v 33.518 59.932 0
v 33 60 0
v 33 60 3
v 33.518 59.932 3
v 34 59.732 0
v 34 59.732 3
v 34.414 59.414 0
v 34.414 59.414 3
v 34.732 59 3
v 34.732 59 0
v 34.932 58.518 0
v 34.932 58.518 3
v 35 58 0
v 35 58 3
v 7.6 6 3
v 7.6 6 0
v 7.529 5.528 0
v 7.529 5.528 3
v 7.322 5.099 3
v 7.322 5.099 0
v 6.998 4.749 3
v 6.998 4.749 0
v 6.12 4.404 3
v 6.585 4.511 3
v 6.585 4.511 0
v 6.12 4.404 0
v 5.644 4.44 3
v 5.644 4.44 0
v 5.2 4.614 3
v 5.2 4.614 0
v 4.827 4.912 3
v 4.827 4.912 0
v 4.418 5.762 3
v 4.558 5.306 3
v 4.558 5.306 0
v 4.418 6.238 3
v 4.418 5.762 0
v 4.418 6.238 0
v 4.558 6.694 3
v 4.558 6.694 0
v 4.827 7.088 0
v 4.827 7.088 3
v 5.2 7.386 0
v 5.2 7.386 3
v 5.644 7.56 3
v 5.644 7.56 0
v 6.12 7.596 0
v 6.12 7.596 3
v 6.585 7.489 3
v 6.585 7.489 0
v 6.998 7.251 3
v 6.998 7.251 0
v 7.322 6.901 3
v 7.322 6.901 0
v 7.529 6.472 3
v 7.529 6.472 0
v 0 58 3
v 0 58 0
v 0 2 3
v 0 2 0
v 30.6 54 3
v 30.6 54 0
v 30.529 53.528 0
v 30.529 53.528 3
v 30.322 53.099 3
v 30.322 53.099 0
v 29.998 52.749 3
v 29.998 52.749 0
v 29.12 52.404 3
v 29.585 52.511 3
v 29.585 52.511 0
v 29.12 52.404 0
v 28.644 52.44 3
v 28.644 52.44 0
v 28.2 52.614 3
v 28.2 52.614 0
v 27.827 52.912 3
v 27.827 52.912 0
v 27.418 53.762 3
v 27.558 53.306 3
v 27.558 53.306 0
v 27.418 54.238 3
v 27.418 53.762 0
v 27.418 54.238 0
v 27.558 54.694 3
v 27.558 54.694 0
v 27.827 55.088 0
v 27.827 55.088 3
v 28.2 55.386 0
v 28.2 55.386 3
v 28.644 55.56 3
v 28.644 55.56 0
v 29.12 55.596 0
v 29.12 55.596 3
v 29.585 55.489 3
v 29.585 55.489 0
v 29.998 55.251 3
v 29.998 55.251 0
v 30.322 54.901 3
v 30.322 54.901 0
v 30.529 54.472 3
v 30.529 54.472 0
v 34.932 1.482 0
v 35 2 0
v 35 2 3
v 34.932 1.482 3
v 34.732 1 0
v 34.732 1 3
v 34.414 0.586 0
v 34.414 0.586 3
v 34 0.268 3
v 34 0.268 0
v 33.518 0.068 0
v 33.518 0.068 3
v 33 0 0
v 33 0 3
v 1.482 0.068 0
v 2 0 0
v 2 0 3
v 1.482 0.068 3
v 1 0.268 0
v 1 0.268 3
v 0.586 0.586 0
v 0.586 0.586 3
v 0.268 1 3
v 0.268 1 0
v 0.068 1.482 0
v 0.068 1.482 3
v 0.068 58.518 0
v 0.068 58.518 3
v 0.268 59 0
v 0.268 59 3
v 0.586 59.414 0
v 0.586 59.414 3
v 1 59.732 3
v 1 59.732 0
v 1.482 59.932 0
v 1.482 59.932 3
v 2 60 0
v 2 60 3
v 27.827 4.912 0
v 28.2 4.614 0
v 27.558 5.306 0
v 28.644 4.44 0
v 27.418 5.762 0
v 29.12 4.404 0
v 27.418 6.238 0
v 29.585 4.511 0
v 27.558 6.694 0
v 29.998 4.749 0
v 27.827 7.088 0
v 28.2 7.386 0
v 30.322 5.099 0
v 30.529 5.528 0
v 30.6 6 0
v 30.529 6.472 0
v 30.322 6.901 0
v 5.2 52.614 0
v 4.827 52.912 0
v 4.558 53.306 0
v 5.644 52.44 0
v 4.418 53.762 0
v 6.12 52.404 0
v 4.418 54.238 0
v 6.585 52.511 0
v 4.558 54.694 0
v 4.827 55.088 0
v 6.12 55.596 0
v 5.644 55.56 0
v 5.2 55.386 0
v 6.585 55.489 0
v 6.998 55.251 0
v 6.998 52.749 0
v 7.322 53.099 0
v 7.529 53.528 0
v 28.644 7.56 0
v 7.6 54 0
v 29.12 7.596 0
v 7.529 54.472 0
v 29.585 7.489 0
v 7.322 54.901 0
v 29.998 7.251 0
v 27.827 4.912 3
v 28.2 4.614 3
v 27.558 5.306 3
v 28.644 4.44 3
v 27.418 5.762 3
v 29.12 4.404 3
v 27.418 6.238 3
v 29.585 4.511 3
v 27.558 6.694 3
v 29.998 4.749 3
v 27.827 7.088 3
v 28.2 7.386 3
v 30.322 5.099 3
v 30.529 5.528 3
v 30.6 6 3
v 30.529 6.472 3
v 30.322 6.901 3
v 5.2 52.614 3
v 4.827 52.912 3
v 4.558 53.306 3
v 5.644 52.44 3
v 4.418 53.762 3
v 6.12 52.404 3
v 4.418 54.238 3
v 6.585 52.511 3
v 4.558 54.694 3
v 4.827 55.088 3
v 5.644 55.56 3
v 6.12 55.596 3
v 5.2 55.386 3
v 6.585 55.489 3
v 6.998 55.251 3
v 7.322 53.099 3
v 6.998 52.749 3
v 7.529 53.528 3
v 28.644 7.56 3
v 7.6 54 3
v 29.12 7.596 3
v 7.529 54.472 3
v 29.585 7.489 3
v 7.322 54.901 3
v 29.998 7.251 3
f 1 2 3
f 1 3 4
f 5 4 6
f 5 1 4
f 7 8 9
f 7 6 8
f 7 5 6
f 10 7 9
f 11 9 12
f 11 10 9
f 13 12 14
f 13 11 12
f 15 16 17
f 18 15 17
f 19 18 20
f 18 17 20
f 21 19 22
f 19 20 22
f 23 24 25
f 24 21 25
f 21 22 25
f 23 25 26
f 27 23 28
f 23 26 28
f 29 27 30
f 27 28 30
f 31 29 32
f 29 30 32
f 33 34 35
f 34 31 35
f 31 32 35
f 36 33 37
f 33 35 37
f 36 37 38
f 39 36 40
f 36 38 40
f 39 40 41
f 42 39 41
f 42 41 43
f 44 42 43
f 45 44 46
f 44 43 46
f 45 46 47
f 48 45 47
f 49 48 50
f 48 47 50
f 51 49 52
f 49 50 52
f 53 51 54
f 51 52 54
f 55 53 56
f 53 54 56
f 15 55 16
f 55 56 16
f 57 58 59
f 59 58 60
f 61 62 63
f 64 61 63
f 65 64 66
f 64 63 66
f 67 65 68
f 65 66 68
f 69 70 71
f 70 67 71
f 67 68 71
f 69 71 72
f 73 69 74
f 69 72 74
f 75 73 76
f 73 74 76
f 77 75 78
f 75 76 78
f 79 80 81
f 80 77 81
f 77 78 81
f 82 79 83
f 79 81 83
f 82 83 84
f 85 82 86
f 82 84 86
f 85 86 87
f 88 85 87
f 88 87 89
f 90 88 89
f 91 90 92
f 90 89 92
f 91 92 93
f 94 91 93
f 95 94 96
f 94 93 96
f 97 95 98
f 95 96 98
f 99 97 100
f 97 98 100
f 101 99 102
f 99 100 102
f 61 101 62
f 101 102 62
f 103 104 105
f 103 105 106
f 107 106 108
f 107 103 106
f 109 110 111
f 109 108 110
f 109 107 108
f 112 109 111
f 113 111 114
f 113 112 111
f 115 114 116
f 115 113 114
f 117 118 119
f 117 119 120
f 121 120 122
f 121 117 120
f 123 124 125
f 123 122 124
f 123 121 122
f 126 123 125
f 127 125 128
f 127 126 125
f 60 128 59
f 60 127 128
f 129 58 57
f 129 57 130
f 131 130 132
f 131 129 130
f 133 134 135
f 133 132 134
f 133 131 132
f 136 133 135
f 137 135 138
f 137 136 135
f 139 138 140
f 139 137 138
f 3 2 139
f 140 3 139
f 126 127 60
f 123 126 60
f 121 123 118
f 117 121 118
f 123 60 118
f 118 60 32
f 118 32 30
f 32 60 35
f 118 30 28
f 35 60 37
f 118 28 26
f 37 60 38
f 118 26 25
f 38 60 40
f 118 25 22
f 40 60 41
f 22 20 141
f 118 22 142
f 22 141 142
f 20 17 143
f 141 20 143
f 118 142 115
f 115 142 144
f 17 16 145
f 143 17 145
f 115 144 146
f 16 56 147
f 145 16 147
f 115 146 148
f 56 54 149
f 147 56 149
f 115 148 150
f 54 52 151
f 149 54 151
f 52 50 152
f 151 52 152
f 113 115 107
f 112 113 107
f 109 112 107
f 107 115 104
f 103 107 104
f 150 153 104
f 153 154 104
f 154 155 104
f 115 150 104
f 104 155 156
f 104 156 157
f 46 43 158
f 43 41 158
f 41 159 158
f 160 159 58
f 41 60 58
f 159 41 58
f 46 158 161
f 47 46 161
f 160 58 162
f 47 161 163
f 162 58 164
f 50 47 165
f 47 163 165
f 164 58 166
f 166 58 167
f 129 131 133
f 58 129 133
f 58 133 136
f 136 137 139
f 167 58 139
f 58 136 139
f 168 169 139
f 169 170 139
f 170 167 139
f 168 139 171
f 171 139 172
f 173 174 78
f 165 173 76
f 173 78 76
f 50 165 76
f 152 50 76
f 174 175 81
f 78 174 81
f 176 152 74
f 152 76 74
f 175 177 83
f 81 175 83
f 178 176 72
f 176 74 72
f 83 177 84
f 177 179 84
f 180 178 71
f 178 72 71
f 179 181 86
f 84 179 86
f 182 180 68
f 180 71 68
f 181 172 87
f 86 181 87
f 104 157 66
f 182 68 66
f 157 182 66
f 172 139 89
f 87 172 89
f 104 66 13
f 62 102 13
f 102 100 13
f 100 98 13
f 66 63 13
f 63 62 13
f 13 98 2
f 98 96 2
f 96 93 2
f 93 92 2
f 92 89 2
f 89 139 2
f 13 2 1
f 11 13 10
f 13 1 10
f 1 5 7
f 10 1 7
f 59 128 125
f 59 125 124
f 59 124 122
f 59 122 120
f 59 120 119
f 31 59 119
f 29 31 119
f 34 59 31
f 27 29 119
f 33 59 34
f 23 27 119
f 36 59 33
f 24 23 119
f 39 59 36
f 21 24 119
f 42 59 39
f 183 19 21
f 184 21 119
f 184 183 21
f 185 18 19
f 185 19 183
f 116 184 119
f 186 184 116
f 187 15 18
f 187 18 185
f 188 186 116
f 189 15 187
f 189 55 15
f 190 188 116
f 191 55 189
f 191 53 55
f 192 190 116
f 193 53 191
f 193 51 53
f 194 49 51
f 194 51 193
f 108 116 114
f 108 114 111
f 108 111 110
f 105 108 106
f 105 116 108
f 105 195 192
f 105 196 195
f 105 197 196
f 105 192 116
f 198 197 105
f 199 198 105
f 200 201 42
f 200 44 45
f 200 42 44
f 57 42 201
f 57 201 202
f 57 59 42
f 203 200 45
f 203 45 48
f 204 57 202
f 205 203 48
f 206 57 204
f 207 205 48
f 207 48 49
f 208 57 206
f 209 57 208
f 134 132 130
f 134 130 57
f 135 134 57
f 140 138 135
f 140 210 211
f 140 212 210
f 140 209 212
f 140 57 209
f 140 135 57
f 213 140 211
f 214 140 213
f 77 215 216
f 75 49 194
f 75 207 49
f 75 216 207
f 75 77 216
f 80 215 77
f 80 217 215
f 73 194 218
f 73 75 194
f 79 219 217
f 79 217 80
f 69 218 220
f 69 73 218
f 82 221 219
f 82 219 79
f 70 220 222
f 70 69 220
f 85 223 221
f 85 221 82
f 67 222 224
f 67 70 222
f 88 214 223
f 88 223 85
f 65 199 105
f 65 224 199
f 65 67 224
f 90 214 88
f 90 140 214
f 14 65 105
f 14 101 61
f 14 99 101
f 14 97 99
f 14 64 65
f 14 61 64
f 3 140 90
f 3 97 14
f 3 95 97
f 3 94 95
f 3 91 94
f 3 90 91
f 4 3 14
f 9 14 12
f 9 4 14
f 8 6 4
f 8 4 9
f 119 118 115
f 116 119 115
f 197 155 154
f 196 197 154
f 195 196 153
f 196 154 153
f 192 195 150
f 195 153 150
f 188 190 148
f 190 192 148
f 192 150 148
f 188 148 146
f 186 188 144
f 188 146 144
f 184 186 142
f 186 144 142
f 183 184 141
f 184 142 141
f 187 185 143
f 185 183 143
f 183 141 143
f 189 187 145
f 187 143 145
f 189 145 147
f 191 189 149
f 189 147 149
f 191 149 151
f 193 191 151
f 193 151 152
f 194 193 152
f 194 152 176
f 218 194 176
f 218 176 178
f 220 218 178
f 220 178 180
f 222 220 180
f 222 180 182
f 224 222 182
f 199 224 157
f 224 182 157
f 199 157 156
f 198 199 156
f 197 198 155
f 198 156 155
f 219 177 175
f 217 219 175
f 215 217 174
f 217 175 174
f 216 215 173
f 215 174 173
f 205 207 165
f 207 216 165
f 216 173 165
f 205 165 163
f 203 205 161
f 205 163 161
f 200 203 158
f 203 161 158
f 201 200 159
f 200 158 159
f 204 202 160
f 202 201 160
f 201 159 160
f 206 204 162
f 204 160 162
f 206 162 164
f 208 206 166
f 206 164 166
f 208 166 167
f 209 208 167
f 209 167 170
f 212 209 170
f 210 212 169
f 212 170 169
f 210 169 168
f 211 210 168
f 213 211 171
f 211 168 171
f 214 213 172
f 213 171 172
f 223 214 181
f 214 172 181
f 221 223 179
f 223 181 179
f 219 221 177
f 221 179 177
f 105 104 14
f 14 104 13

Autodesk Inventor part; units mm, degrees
ref_plane "YZ Plane" through (0, 0, 0) normal (1, 0, 0) x (0, 1, 0)
ref_plane "XZ Plane" through (0, 0, 0) normal (0, 1, 0) x (-1, 0, 0)
ref_plane "XY Plane" through (0, 0, 0) normal (0, 0, 1) x (1, 0, 0)
sketch "Skizze1" plane through (0, 0, 0) normal (0, 0, 1) x (1, 0, 0)
  line L0 (2, 0) -> (33, 0)
  line L1 (35, 2) -> (35, 58)
  line L2 (33, 60) -> (2, 60)
  line L3 (0, 58) -> (0, 2)
  arc A0 (2, 60) -> (0, 58) centre (2, 58) ccw
  arc A1 (0, 2) -> (2, 0) centre (2, 2) ccw
  arc A2 (33, 0) -> (35, 2) centre (33, 2) ccw
  arc A3 (35, 58) -> (33, 60) centre (33, 58) ccw
  circle A4 centre (6, 54) radius 1.6
  circle A5 centre (29, 54) radius 1.6
  circle A6 centre (6, 6) radius 1.6
  circle A7 centre (29, 6) radius 1.6
  point P0 (0, 0)
  dimension "d0" = 60
  dimension "d1" = 35
  dimension "d2" = 2
  dimension "d3" = 3.2
  dimension "d4" = 3.2
  dimension "d5" = 3.2
  dimension "d6" = 3.2
  dimension "d7" = 6
  dimension "d8" = 6
  dimension "d9" = 6
  dimension "d10" = 6
extrude "Extrusion1" add sketch "Skizze1" along normal blind 3
properties part number "103.017.01_Abdeckplatte_Extruderfuehrung" material "PMMA-Kunststoff"
